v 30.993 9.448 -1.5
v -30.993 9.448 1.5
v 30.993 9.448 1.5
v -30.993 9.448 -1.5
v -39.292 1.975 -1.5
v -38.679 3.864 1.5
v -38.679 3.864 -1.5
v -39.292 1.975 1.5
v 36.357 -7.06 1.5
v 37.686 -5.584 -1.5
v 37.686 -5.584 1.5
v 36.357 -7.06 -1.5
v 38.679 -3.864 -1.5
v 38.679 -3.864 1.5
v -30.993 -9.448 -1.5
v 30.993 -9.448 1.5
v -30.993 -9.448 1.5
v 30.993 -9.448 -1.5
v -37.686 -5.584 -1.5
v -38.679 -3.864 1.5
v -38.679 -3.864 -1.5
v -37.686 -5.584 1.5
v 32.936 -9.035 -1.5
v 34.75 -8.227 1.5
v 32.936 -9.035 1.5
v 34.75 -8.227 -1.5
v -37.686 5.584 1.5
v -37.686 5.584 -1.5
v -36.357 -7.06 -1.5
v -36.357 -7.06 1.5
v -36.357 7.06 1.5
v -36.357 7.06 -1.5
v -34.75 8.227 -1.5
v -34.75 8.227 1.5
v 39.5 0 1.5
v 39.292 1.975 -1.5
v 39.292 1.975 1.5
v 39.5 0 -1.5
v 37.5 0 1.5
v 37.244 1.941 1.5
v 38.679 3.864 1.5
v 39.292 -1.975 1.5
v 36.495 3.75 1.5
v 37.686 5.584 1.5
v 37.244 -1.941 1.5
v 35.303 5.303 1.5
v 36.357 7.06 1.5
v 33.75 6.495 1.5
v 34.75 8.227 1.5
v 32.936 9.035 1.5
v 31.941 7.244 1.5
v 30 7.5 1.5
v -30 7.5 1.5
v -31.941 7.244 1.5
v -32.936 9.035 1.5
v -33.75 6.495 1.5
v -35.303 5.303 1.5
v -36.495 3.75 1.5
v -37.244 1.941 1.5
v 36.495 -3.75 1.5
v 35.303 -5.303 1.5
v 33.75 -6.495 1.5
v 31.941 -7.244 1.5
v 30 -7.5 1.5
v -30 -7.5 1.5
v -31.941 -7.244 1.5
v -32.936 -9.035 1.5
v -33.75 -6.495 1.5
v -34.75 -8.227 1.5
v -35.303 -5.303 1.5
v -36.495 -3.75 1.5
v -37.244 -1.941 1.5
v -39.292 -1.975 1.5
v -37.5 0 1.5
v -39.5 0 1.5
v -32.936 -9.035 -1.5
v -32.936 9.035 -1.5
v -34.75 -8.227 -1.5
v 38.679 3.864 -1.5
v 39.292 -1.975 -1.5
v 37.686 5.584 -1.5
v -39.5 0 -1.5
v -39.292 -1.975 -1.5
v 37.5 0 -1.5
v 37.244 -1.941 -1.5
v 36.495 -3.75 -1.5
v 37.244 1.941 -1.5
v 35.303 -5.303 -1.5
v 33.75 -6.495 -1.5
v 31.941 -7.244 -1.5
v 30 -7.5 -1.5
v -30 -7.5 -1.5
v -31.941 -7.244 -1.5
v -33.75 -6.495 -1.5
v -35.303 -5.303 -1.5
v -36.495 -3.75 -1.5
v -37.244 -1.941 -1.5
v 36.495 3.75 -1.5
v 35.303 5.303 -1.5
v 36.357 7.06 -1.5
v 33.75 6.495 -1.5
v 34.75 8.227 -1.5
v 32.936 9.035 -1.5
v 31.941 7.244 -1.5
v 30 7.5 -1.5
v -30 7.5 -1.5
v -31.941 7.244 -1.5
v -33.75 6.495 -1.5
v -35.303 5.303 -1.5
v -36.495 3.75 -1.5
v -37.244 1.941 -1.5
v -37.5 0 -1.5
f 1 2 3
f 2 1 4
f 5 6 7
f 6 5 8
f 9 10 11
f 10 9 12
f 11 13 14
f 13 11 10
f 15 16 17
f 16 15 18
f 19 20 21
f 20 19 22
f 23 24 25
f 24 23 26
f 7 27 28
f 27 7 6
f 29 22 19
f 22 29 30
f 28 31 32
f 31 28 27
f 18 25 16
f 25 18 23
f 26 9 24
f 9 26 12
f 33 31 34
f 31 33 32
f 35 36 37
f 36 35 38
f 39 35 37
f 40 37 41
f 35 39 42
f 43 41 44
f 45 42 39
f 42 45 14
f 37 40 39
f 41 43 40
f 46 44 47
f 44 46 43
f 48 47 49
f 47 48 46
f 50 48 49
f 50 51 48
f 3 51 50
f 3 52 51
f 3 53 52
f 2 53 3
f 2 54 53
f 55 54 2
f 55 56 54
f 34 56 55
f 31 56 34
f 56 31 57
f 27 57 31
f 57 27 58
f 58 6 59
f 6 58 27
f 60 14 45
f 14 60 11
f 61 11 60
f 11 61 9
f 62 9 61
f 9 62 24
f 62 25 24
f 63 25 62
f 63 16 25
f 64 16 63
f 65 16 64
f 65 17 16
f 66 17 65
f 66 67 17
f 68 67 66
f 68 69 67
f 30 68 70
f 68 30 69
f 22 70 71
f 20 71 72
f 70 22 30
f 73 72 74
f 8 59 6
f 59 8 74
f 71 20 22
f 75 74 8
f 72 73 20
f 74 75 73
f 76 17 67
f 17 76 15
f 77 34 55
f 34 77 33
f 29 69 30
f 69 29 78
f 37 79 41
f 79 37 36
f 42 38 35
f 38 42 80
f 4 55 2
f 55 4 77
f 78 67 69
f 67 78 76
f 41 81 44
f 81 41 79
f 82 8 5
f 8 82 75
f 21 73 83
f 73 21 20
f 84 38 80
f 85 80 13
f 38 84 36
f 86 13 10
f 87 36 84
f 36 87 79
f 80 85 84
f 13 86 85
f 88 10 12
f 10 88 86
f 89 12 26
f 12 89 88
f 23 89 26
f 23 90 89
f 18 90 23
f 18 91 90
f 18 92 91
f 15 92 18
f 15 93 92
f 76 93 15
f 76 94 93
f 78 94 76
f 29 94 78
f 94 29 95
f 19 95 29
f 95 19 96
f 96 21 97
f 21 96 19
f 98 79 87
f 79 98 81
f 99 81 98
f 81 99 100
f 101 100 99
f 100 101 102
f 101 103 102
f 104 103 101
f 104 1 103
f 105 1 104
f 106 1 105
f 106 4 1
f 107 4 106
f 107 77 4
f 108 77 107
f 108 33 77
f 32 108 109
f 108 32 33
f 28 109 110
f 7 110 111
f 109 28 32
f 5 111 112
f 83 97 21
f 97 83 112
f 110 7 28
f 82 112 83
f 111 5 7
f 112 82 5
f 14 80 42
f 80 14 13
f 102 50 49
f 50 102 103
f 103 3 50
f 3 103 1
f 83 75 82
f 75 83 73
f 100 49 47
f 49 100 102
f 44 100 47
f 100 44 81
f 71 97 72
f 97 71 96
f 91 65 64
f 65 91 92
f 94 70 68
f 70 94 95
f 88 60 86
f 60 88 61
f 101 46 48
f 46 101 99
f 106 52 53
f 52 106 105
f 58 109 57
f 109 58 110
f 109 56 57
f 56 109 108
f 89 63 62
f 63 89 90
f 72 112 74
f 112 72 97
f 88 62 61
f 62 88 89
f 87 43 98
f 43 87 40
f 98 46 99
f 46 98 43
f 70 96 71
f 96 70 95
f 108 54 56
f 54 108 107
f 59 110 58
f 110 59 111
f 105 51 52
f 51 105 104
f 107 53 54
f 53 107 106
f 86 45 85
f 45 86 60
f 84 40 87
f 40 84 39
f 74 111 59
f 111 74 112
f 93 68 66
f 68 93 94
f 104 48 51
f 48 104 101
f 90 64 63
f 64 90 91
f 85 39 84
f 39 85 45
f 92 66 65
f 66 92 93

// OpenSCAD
RAD = 15/2;
MAIN_LEN = 115;
TOT_WIDTH = 75;

cyl_offset = (TOT_WIDTH - (2*RAD) )/2;

difference(){
    hull(){
        translate([cyl_offset,0,0]){
            cylinder(3,RAD+2,RAD+2,center=true);
        }
        translate([-cyl_offset,0,0]){
            cylinder(3,RAD+2,RAD+2,center=true);
        }

    }

    hull(){
        translate([cyl_offset,0,0]){
            cylinder(MAIN_LEN,RAD,RAD,center=true);
        }
        translate([-cyl_offset,0,0]){
            cylinder(MAIN_LEN,RAD,RAD,center=true);
        }

    }
    
}
